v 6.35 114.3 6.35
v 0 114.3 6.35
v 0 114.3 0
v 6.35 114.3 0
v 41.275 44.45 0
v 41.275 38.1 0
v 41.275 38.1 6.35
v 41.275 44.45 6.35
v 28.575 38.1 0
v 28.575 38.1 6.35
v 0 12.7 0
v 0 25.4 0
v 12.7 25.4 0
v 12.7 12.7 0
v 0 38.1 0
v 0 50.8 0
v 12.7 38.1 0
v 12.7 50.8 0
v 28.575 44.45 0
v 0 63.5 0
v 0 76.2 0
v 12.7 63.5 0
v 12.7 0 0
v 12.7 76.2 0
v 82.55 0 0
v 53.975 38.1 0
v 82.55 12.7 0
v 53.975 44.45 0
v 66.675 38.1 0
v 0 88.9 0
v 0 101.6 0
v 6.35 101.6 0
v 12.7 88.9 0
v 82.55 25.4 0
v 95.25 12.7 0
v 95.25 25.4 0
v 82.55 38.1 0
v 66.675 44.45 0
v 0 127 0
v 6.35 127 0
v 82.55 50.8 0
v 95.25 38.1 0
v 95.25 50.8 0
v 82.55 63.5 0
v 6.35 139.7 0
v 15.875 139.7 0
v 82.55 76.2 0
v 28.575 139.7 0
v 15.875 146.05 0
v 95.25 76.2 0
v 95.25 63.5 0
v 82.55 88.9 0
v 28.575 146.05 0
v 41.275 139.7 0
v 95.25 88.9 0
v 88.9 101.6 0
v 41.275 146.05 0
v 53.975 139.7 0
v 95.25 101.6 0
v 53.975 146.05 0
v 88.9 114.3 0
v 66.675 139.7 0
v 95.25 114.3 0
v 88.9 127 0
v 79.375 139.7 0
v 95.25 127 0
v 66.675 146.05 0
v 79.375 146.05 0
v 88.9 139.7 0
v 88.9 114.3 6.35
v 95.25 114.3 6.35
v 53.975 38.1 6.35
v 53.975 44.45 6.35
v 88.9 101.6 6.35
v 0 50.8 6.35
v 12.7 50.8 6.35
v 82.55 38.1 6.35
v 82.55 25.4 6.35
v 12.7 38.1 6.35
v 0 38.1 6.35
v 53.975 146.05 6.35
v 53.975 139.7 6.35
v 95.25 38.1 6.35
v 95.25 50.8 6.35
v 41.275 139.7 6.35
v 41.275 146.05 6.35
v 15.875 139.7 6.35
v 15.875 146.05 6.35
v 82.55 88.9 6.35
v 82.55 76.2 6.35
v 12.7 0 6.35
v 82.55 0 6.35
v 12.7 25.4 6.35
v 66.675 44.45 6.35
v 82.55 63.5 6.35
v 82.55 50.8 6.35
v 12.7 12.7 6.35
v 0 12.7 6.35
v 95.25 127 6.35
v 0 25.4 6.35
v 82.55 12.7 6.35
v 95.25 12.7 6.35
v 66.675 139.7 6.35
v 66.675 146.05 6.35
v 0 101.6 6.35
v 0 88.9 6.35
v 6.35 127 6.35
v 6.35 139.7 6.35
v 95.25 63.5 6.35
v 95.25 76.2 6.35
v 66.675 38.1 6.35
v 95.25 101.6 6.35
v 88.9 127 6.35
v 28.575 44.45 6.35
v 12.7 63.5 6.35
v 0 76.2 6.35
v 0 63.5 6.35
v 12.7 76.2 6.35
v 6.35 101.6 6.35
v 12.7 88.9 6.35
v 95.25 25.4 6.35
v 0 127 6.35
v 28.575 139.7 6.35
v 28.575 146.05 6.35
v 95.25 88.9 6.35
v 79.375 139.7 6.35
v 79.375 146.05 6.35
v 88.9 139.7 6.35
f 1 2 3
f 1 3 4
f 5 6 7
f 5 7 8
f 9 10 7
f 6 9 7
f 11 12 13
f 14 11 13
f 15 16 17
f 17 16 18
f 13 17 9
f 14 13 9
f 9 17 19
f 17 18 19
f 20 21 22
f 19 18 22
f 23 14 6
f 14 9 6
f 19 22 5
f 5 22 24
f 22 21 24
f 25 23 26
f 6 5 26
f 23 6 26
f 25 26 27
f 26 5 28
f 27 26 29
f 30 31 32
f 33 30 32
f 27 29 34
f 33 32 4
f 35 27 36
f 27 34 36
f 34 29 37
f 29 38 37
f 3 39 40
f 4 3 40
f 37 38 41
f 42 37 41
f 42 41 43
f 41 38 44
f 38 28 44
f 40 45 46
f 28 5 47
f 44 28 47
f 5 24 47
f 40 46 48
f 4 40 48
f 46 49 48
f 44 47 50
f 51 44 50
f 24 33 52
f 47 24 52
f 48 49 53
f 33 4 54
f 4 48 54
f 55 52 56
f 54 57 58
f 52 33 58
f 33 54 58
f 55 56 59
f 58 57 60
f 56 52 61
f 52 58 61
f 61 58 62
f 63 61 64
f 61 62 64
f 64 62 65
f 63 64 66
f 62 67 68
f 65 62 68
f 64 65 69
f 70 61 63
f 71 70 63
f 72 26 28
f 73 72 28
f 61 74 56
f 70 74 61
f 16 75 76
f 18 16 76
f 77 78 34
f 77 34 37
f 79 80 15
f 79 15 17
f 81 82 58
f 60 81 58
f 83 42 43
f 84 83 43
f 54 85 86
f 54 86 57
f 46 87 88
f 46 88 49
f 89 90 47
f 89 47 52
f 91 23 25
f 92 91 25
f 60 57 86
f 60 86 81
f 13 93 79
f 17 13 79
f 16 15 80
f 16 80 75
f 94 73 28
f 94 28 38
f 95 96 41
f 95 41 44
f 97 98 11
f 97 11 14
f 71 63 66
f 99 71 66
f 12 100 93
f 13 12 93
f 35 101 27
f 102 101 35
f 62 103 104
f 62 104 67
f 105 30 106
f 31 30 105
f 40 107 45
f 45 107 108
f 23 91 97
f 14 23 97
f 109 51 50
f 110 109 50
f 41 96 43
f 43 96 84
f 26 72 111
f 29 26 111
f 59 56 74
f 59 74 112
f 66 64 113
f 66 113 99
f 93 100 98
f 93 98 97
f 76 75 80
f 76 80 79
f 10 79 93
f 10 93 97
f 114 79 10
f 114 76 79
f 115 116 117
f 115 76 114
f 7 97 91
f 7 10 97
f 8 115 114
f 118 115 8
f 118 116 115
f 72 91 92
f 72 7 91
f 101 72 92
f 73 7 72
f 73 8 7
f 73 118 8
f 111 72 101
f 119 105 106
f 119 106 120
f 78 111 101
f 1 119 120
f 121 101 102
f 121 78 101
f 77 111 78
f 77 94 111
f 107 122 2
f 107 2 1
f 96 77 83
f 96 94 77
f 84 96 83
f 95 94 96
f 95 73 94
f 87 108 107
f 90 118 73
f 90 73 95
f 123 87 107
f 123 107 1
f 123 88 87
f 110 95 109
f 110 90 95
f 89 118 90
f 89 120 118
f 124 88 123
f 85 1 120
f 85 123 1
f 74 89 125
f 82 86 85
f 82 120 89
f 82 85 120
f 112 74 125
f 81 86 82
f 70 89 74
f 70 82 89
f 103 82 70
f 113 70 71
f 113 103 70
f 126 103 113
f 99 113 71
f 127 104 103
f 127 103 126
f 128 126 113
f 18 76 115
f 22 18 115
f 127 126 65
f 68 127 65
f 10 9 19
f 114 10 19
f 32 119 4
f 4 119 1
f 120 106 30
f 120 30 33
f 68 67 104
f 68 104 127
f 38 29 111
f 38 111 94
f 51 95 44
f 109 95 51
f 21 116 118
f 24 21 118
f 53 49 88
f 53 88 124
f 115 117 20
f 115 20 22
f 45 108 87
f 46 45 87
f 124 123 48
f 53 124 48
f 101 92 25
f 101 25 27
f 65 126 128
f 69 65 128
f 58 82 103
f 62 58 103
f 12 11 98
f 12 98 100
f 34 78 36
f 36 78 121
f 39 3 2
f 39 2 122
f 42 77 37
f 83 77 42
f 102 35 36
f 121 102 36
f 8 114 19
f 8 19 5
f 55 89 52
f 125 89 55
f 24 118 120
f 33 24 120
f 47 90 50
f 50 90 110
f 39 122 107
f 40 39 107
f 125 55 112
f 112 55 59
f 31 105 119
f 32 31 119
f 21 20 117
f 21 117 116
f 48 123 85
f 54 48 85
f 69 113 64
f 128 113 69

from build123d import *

# Parameters (mm, degrees)
SKETCH1_W           = 95.25
SKETCH1_H           = 177.8
BOSS_EXTRUDE1_DEPTH = 6.35
SKETCH2_W           = 12.7
SKETCH2_H           = 12.7
CUT_EXTRUDE1_DEPTH  = 7.35
LPATTERN1_COUNT     = 4
LPATTERN1_PITCH     = 25.4
SKETCH3_W           = 12.7
SKETCH3_H           = 6.35
CUT_EXTRUDE2_DEPTH  = 7.35
SKETCH5_W           = 6.35
SKETCH5_H           = 12.7
CUT_EXTRUDE4_DEPTH  = 7.35
LPATTERN2_COUNT     = 4
LPATTERN2_PITCH     = 25.4
SKETCH6_W           = 95.25
SKETCH6_H           = 38.1
CUT_EXTRUDE5_DEPTH  = 7.35
SKETCH7_W           = 12.7
SKETCH7_H           = 6.35
BOSS_EXTRUDE2_DEPTH = 6.35
LPATTERN3_COUNT     = 2
LPATTERN3_PITCH     = 25.4
LPATTERN3_COL_COUNT = 2
LPATTERN3_COL_PITCH = 25.4


with BuildPart() as part:
    # Sketch1 → Boss-Extrude1 (new body)
    with BuildSketch(Plane.XY):
        with Locations((47.625, 88.9)):
            Rectangle(SKETCH1_W, SKETCH1_H)
    extrude(amount=BOSS_EXTRUDE1_DEPTH)

    # Sketch2 → Cut-Extrude1 (cut, through all)
    with BuildSketch(Plane.XY.offset(6.35)):
        with Locations((6.35, 6.35)):
            Rectangle(SKETCH2_W, SKETCH2_H)
        with Locations((88.9, 6.35)):
            Rectangle(SKETCH2_W, SKETCH2_H)
    cut_extrude1 = extrude(amount=-CUT_EXTRUDE1_DEPTH, mode=Mode.SUBTRACT)

    # LPattern1: Cut-Extrude1 ×4
    with Locations(*[(0, i * LPATTERN1_PITCH, 0) for i in range(1, LPATTERN1_COUNT)]):
        add(cut_extrude1, mode=Mode.SUBTRACT)

    # Sketch3 → Cut-Extrude2 (cut, through all)
    with BuildSketch(Plane.XY.offset(6.35)):
        with Locations((34.925, 41.275)):
            Rectangle(SKETCH3_W, SKETCH3_H)
        with Locations((60.325, 41.275)):
            Rectangle(SKETCH3_W, SKETCH3_H)
    extrude(amount=-CUT_EXTRUDE2_DEPTH, mode=Mode.SUBTRACT)

    # Sketch5 → Cut-Extrude4 (cut, through all)
    with BuildSketch(Plane.XY.offset(6.35)):
        with Locations((3.175, 107.95)):
            Rectangle(SKETCH5_W, SKETCH5_H)
        with Locations((92.075, 107.95)):
            Rectangle(SKETCH5_W, SKETCH5_H)
    cut_extrude4 = extrude(amount=-CUT_EXTRUDE4_DEPTH, mode=Mode.SUBTRACT)

    # LPattern2: Cut-Extrude4 ×4
    with Locations(*[(0, i * LPATTERN2_PITCH, 0) for i in range(1, LPATTERN2_COUNT)]):
        add(cut_extrude4, mode=Mode.SUBTRACT)

    # Sketch6 → Cut-Extrude5 (cut, through all)
    with BuildSketch(Plane.XY.offset(6.35)):
        with Locations((47.625, 158.75)):
            Rectangle(SKETCH6_W, SKETCH6_H)
    extrude(amount=-CUT_EXTRUDE5_DEPTH, mode=Mode.SUBTRACT)

    # Sketch7 → Boss-Extrude2 (add)
    with BuildSketch(Plane(origin=(0, 139.7, 0), x_dir=(1, 0, 0), z_dir=(0, 1, 0))):
        with Locations((47.625, -3.175)):
            Rectangle(SKETCH7_W, SKETCH7_H)
    boss_extrude2 = extrude(amount=BOSS_EXTRUDE2_DEPTH)

    # LPattern3: Boss-Extrude2 ×2
    with Locations(*[(i * LPATTERN3_PITCH, 0, 0) for i in range(1, LPATTERN3_COUNT)]):
        add(boss_extrude2)

    # LPattern3 col: Boss-Extrude2 ×2
    with Locations(*[(-i * LPATTERN3_COL_PITCH, 0, 0) for i in range(1, LPATTERN3_COL_COUNT)]):
        add(boss_extrude2)


solid = part.part
